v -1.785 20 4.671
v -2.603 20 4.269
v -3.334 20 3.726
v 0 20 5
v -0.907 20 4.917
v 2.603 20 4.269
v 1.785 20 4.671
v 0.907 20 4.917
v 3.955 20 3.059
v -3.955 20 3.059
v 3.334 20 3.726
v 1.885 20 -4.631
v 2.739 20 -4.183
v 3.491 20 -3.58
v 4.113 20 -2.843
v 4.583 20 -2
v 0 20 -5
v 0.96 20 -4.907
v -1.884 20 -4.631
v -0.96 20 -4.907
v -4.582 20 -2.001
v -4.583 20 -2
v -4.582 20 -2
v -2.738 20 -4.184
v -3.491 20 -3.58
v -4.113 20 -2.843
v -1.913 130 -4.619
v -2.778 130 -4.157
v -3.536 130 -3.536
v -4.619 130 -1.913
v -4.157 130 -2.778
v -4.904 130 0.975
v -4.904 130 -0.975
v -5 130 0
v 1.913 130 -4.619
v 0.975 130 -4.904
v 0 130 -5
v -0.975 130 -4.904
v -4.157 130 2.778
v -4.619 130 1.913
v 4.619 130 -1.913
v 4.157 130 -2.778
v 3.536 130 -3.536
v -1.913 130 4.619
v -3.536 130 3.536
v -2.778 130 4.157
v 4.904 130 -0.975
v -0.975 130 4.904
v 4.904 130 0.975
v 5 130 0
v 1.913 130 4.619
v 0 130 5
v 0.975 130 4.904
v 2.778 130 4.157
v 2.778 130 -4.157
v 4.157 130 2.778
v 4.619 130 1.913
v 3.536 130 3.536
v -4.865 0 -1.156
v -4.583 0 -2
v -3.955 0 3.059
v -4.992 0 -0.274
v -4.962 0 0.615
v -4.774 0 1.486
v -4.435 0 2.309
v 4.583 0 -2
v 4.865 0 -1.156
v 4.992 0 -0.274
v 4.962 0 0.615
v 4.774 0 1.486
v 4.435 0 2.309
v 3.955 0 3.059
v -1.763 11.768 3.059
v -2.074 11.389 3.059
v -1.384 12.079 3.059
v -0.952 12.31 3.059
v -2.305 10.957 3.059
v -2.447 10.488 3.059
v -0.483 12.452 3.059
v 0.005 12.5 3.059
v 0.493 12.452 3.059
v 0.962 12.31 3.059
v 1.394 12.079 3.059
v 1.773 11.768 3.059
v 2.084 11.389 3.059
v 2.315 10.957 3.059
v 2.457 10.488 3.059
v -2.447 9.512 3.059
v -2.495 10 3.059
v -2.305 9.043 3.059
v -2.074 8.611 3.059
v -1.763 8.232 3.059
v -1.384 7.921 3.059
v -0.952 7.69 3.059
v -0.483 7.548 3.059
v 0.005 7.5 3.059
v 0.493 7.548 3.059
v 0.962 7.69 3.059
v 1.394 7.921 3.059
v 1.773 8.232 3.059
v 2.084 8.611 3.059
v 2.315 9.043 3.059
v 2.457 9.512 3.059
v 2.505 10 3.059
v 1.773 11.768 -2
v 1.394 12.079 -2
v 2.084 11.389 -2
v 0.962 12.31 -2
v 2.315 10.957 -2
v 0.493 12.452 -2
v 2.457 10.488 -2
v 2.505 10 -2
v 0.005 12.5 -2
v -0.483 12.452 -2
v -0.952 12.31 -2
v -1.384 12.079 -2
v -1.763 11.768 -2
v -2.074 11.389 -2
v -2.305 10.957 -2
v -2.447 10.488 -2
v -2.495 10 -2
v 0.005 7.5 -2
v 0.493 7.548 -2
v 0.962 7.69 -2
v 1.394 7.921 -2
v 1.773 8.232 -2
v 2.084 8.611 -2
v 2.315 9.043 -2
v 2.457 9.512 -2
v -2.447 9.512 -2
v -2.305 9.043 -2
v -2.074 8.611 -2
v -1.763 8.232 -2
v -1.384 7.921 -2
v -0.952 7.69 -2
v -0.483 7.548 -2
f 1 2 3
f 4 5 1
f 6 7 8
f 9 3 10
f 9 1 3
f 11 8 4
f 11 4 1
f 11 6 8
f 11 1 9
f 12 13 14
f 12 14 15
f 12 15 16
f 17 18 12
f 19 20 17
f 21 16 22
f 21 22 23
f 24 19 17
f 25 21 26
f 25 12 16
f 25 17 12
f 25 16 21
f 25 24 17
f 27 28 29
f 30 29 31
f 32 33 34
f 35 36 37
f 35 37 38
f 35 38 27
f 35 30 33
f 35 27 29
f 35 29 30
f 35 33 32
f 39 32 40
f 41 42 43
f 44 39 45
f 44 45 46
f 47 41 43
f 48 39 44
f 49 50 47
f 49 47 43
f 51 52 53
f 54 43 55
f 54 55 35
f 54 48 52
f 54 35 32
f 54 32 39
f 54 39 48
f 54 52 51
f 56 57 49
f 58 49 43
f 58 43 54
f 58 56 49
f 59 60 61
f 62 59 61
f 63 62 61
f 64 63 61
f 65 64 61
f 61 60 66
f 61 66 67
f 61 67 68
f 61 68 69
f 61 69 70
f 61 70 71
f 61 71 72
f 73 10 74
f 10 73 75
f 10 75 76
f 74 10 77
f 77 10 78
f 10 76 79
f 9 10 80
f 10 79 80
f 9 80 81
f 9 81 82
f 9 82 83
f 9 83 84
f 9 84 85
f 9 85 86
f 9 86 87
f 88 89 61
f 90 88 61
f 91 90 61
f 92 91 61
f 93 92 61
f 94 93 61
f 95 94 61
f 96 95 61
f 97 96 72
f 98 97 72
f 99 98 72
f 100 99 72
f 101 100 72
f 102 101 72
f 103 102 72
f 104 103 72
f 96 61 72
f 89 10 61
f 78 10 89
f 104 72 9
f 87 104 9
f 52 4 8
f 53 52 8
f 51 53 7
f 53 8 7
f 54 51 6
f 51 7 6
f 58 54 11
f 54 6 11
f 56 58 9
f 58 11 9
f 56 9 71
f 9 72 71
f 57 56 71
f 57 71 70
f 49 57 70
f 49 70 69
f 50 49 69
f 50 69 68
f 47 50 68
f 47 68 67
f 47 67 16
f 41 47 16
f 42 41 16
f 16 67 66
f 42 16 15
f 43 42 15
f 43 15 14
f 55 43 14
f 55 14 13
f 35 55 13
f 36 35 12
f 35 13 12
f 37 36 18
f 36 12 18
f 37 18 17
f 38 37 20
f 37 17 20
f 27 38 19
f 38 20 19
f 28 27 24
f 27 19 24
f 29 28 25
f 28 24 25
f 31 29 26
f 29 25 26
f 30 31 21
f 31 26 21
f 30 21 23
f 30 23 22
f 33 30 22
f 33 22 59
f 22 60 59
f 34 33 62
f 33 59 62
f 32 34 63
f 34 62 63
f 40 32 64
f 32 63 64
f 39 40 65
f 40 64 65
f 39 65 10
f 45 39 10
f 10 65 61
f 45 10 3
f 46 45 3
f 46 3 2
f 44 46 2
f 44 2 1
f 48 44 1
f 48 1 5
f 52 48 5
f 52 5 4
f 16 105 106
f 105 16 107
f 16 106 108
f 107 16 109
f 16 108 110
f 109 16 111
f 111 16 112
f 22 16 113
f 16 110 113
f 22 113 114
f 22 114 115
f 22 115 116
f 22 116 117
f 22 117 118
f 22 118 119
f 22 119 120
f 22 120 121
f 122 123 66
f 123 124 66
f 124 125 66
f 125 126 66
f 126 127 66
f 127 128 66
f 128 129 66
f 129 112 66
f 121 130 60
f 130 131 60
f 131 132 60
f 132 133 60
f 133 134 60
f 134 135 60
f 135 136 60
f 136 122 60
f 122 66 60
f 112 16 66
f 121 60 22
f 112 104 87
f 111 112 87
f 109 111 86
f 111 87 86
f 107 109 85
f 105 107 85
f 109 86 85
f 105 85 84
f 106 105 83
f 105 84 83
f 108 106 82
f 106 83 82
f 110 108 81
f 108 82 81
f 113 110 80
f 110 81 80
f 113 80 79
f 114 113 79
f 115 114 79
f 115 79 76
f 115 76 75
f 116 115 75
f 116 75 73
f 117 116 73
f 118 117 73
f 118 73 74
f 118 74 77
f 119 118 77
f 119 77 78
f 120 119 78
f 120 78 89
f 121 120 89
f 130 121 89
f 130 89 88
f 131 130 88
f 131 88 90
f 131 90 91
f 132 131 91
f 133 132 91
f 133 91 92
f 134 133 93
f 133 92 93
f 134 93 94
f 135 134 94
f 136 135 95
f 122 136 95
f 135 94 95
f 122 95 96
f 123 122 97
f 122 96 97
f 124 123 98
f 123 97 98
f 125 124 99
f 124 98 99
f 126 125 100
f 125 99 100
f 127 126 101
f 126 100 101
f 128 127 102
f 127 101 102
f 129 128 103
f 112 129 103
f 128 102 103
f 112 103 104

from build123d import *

# Parameters (mm, degrees)
ESQUISSE1_R             = 5
BOSS_EXTRU_1_DEPTH      = 130
ENL_V_MAT_EXTRU_2_DEPTH = 20
ENL_V_MAT_EXTRU_3_DEPTH = 20
ESQUISSE4_R             = 2.5
ENL_V_MAT_EXTRU_4_DEPTH = 60


with BuildPart() as part:
    # Esquisse1 → Boss.-Extru.1 (new body)
    with BuildSketch(Plane(origin=(0, 0, 0), x_dir=(1, 0, 0), z_dir=(0, 1, 0))):
        with Locations(Location((0, 0, 0), (0, 0, 270))):
            Circle(ESQUISSE1_R)
    extrude(amount=BOSS_EXTRU_1_DEPTH)

    # Esquisse2 → Enlèv. mat.-Extru.2 (cut)
    with BuildSketch(Plane(origin=(0, 0, 0), x_dir=(-1, 0, 0), z_dir=(0, -1, 0))):
        with BuildLine():
            Line((-4.582575695, 2), (4.582575695, 2))
            ThreePointArc((4.582575695, 2), (4.582464701, 2.0002543), (4.582353692, 2.000508595))
            ThreePointArc((4.582353692, 2.000508595), (-0.000277468, 4.999999992), (-4.582575695, 2))
        make_face()
    extrude(amount=-ENL_V_MAT_EXTRU_2_DEPTH, mode=Mode.SUBTRACT)

    # Esquisse3 → Enlèv. mat.-Extru.3 (cut)
    with BuildSketch(Plane.XZ):
        with BuildLine():
            ThreePointArc((3.95513796, 3.058902371), (0, 5), (-3.95513796, 3.058902371))
            Line((-3.95513796, 3.058902371), (3.95513796, 3.058902371))
        make_face()
    extrude(amount=-ENL_V_MAT_EXTRU_3_DEPTH, mode=Mode.SUBTRACT)

    # Esquisse4 → Enlèv. mat.-Extru.4 (cut)
    with BuildSketch(Plane.XY.offset(3.058902371)):
        with Locations((0.00513796, 10)):
            Circle(ESQUISSE4_R)
    extrude(amount=-ENL_V_MAT_EXTRU_4_DEPTH, mode=Mode.SUBTRACT)


solid = part.part
